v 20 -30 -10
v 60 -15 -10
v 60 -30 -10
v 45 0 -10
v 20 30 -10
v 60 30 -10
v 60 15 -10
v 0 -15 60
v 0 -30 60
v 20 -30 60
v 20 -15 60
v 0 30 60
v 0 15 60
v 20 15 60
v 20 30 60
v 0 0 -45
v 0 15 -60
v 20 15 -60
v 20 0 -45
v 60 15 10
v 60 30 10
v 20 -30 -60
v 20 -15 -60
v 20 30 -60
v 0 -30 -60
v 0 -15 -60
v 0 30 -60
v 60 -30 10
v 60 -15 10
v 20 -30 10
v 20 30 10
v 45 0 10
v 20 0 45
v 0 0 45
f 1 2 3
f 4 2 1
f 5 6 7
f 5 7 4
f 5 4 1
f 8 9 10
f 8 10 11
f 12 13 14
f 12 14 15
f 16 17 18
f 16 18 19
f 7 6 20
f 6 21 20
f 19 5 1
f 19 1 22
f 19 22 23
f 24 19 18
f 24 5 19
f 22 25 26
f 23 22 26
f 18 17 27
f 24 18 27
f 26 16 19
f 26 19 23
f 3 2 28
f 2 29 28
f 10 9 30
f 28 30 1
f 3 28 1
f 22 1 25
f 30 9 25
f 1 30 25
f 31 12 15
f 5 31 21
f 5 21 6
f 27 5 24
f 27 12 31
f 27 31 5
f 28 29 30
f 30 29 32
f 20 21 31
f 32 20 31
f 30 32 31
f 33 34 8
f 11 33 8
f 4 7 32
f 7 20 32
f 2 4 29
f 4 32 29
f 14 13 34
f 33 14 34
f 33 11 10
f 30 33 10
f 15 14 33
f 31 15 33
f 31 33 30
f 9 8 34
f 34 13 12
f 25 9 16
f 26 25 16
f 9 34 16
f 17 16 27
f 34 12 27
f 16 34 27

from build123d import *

# Parameters (mm, degrees)
SKETCH1_W           = 120
SKETCH1_H           = 60
BOSS_EXTRUDE1_DEPTH = 20
CUT_EXTRUDE1_DEPTH  = 20
BOSS_EXTRUDE2_DEPTH = 10


with BuildPart() as part:
    # Sketch1 → Boss-Extrude1 (new body)
    with BuildSketch(Plane(origin=(0, 0, 0), x_dir=(0, 0, -1), z_dir=(1, 0, 0))):
        Rectangle(SKETCH1_W, SKETCH1_H)
    extrude(amount=BOSS_EXTRUDE1_DEPTH)

    # Sketch3 → Cut-Extrude1 (cut)
    with BuildSketch(Plane.ZY):
        Polygon((45, 0), (60, -15), (60, 15), align=None)
    cut_extrude1 = extrude(amount=-CUT_EXTRUDE1_DEPTH, mode=Mode.SUBTRACT)

    # Mirror4: Cut-Extrude1 across plane
    add(cut_extrude1.mirror(Plane(origin=(0, 0, 0), x_dir=(1, 0, 0), z_dir=(0, 0, -1))), mode=Mode.SUBTRACT)

    # Sketch4 → Boss-Extrude2 (add, symmetric)
    with BuildSketch(Plane.XY):
        Polygon((20, 30), (60, 30), (60, 15), (45, 0), (60, -15), (60, -30), (20, -30), align=None)
    extrude(amount=BOSS_EXTRUDE2_DEPTH, both=True)


solid = part.part
